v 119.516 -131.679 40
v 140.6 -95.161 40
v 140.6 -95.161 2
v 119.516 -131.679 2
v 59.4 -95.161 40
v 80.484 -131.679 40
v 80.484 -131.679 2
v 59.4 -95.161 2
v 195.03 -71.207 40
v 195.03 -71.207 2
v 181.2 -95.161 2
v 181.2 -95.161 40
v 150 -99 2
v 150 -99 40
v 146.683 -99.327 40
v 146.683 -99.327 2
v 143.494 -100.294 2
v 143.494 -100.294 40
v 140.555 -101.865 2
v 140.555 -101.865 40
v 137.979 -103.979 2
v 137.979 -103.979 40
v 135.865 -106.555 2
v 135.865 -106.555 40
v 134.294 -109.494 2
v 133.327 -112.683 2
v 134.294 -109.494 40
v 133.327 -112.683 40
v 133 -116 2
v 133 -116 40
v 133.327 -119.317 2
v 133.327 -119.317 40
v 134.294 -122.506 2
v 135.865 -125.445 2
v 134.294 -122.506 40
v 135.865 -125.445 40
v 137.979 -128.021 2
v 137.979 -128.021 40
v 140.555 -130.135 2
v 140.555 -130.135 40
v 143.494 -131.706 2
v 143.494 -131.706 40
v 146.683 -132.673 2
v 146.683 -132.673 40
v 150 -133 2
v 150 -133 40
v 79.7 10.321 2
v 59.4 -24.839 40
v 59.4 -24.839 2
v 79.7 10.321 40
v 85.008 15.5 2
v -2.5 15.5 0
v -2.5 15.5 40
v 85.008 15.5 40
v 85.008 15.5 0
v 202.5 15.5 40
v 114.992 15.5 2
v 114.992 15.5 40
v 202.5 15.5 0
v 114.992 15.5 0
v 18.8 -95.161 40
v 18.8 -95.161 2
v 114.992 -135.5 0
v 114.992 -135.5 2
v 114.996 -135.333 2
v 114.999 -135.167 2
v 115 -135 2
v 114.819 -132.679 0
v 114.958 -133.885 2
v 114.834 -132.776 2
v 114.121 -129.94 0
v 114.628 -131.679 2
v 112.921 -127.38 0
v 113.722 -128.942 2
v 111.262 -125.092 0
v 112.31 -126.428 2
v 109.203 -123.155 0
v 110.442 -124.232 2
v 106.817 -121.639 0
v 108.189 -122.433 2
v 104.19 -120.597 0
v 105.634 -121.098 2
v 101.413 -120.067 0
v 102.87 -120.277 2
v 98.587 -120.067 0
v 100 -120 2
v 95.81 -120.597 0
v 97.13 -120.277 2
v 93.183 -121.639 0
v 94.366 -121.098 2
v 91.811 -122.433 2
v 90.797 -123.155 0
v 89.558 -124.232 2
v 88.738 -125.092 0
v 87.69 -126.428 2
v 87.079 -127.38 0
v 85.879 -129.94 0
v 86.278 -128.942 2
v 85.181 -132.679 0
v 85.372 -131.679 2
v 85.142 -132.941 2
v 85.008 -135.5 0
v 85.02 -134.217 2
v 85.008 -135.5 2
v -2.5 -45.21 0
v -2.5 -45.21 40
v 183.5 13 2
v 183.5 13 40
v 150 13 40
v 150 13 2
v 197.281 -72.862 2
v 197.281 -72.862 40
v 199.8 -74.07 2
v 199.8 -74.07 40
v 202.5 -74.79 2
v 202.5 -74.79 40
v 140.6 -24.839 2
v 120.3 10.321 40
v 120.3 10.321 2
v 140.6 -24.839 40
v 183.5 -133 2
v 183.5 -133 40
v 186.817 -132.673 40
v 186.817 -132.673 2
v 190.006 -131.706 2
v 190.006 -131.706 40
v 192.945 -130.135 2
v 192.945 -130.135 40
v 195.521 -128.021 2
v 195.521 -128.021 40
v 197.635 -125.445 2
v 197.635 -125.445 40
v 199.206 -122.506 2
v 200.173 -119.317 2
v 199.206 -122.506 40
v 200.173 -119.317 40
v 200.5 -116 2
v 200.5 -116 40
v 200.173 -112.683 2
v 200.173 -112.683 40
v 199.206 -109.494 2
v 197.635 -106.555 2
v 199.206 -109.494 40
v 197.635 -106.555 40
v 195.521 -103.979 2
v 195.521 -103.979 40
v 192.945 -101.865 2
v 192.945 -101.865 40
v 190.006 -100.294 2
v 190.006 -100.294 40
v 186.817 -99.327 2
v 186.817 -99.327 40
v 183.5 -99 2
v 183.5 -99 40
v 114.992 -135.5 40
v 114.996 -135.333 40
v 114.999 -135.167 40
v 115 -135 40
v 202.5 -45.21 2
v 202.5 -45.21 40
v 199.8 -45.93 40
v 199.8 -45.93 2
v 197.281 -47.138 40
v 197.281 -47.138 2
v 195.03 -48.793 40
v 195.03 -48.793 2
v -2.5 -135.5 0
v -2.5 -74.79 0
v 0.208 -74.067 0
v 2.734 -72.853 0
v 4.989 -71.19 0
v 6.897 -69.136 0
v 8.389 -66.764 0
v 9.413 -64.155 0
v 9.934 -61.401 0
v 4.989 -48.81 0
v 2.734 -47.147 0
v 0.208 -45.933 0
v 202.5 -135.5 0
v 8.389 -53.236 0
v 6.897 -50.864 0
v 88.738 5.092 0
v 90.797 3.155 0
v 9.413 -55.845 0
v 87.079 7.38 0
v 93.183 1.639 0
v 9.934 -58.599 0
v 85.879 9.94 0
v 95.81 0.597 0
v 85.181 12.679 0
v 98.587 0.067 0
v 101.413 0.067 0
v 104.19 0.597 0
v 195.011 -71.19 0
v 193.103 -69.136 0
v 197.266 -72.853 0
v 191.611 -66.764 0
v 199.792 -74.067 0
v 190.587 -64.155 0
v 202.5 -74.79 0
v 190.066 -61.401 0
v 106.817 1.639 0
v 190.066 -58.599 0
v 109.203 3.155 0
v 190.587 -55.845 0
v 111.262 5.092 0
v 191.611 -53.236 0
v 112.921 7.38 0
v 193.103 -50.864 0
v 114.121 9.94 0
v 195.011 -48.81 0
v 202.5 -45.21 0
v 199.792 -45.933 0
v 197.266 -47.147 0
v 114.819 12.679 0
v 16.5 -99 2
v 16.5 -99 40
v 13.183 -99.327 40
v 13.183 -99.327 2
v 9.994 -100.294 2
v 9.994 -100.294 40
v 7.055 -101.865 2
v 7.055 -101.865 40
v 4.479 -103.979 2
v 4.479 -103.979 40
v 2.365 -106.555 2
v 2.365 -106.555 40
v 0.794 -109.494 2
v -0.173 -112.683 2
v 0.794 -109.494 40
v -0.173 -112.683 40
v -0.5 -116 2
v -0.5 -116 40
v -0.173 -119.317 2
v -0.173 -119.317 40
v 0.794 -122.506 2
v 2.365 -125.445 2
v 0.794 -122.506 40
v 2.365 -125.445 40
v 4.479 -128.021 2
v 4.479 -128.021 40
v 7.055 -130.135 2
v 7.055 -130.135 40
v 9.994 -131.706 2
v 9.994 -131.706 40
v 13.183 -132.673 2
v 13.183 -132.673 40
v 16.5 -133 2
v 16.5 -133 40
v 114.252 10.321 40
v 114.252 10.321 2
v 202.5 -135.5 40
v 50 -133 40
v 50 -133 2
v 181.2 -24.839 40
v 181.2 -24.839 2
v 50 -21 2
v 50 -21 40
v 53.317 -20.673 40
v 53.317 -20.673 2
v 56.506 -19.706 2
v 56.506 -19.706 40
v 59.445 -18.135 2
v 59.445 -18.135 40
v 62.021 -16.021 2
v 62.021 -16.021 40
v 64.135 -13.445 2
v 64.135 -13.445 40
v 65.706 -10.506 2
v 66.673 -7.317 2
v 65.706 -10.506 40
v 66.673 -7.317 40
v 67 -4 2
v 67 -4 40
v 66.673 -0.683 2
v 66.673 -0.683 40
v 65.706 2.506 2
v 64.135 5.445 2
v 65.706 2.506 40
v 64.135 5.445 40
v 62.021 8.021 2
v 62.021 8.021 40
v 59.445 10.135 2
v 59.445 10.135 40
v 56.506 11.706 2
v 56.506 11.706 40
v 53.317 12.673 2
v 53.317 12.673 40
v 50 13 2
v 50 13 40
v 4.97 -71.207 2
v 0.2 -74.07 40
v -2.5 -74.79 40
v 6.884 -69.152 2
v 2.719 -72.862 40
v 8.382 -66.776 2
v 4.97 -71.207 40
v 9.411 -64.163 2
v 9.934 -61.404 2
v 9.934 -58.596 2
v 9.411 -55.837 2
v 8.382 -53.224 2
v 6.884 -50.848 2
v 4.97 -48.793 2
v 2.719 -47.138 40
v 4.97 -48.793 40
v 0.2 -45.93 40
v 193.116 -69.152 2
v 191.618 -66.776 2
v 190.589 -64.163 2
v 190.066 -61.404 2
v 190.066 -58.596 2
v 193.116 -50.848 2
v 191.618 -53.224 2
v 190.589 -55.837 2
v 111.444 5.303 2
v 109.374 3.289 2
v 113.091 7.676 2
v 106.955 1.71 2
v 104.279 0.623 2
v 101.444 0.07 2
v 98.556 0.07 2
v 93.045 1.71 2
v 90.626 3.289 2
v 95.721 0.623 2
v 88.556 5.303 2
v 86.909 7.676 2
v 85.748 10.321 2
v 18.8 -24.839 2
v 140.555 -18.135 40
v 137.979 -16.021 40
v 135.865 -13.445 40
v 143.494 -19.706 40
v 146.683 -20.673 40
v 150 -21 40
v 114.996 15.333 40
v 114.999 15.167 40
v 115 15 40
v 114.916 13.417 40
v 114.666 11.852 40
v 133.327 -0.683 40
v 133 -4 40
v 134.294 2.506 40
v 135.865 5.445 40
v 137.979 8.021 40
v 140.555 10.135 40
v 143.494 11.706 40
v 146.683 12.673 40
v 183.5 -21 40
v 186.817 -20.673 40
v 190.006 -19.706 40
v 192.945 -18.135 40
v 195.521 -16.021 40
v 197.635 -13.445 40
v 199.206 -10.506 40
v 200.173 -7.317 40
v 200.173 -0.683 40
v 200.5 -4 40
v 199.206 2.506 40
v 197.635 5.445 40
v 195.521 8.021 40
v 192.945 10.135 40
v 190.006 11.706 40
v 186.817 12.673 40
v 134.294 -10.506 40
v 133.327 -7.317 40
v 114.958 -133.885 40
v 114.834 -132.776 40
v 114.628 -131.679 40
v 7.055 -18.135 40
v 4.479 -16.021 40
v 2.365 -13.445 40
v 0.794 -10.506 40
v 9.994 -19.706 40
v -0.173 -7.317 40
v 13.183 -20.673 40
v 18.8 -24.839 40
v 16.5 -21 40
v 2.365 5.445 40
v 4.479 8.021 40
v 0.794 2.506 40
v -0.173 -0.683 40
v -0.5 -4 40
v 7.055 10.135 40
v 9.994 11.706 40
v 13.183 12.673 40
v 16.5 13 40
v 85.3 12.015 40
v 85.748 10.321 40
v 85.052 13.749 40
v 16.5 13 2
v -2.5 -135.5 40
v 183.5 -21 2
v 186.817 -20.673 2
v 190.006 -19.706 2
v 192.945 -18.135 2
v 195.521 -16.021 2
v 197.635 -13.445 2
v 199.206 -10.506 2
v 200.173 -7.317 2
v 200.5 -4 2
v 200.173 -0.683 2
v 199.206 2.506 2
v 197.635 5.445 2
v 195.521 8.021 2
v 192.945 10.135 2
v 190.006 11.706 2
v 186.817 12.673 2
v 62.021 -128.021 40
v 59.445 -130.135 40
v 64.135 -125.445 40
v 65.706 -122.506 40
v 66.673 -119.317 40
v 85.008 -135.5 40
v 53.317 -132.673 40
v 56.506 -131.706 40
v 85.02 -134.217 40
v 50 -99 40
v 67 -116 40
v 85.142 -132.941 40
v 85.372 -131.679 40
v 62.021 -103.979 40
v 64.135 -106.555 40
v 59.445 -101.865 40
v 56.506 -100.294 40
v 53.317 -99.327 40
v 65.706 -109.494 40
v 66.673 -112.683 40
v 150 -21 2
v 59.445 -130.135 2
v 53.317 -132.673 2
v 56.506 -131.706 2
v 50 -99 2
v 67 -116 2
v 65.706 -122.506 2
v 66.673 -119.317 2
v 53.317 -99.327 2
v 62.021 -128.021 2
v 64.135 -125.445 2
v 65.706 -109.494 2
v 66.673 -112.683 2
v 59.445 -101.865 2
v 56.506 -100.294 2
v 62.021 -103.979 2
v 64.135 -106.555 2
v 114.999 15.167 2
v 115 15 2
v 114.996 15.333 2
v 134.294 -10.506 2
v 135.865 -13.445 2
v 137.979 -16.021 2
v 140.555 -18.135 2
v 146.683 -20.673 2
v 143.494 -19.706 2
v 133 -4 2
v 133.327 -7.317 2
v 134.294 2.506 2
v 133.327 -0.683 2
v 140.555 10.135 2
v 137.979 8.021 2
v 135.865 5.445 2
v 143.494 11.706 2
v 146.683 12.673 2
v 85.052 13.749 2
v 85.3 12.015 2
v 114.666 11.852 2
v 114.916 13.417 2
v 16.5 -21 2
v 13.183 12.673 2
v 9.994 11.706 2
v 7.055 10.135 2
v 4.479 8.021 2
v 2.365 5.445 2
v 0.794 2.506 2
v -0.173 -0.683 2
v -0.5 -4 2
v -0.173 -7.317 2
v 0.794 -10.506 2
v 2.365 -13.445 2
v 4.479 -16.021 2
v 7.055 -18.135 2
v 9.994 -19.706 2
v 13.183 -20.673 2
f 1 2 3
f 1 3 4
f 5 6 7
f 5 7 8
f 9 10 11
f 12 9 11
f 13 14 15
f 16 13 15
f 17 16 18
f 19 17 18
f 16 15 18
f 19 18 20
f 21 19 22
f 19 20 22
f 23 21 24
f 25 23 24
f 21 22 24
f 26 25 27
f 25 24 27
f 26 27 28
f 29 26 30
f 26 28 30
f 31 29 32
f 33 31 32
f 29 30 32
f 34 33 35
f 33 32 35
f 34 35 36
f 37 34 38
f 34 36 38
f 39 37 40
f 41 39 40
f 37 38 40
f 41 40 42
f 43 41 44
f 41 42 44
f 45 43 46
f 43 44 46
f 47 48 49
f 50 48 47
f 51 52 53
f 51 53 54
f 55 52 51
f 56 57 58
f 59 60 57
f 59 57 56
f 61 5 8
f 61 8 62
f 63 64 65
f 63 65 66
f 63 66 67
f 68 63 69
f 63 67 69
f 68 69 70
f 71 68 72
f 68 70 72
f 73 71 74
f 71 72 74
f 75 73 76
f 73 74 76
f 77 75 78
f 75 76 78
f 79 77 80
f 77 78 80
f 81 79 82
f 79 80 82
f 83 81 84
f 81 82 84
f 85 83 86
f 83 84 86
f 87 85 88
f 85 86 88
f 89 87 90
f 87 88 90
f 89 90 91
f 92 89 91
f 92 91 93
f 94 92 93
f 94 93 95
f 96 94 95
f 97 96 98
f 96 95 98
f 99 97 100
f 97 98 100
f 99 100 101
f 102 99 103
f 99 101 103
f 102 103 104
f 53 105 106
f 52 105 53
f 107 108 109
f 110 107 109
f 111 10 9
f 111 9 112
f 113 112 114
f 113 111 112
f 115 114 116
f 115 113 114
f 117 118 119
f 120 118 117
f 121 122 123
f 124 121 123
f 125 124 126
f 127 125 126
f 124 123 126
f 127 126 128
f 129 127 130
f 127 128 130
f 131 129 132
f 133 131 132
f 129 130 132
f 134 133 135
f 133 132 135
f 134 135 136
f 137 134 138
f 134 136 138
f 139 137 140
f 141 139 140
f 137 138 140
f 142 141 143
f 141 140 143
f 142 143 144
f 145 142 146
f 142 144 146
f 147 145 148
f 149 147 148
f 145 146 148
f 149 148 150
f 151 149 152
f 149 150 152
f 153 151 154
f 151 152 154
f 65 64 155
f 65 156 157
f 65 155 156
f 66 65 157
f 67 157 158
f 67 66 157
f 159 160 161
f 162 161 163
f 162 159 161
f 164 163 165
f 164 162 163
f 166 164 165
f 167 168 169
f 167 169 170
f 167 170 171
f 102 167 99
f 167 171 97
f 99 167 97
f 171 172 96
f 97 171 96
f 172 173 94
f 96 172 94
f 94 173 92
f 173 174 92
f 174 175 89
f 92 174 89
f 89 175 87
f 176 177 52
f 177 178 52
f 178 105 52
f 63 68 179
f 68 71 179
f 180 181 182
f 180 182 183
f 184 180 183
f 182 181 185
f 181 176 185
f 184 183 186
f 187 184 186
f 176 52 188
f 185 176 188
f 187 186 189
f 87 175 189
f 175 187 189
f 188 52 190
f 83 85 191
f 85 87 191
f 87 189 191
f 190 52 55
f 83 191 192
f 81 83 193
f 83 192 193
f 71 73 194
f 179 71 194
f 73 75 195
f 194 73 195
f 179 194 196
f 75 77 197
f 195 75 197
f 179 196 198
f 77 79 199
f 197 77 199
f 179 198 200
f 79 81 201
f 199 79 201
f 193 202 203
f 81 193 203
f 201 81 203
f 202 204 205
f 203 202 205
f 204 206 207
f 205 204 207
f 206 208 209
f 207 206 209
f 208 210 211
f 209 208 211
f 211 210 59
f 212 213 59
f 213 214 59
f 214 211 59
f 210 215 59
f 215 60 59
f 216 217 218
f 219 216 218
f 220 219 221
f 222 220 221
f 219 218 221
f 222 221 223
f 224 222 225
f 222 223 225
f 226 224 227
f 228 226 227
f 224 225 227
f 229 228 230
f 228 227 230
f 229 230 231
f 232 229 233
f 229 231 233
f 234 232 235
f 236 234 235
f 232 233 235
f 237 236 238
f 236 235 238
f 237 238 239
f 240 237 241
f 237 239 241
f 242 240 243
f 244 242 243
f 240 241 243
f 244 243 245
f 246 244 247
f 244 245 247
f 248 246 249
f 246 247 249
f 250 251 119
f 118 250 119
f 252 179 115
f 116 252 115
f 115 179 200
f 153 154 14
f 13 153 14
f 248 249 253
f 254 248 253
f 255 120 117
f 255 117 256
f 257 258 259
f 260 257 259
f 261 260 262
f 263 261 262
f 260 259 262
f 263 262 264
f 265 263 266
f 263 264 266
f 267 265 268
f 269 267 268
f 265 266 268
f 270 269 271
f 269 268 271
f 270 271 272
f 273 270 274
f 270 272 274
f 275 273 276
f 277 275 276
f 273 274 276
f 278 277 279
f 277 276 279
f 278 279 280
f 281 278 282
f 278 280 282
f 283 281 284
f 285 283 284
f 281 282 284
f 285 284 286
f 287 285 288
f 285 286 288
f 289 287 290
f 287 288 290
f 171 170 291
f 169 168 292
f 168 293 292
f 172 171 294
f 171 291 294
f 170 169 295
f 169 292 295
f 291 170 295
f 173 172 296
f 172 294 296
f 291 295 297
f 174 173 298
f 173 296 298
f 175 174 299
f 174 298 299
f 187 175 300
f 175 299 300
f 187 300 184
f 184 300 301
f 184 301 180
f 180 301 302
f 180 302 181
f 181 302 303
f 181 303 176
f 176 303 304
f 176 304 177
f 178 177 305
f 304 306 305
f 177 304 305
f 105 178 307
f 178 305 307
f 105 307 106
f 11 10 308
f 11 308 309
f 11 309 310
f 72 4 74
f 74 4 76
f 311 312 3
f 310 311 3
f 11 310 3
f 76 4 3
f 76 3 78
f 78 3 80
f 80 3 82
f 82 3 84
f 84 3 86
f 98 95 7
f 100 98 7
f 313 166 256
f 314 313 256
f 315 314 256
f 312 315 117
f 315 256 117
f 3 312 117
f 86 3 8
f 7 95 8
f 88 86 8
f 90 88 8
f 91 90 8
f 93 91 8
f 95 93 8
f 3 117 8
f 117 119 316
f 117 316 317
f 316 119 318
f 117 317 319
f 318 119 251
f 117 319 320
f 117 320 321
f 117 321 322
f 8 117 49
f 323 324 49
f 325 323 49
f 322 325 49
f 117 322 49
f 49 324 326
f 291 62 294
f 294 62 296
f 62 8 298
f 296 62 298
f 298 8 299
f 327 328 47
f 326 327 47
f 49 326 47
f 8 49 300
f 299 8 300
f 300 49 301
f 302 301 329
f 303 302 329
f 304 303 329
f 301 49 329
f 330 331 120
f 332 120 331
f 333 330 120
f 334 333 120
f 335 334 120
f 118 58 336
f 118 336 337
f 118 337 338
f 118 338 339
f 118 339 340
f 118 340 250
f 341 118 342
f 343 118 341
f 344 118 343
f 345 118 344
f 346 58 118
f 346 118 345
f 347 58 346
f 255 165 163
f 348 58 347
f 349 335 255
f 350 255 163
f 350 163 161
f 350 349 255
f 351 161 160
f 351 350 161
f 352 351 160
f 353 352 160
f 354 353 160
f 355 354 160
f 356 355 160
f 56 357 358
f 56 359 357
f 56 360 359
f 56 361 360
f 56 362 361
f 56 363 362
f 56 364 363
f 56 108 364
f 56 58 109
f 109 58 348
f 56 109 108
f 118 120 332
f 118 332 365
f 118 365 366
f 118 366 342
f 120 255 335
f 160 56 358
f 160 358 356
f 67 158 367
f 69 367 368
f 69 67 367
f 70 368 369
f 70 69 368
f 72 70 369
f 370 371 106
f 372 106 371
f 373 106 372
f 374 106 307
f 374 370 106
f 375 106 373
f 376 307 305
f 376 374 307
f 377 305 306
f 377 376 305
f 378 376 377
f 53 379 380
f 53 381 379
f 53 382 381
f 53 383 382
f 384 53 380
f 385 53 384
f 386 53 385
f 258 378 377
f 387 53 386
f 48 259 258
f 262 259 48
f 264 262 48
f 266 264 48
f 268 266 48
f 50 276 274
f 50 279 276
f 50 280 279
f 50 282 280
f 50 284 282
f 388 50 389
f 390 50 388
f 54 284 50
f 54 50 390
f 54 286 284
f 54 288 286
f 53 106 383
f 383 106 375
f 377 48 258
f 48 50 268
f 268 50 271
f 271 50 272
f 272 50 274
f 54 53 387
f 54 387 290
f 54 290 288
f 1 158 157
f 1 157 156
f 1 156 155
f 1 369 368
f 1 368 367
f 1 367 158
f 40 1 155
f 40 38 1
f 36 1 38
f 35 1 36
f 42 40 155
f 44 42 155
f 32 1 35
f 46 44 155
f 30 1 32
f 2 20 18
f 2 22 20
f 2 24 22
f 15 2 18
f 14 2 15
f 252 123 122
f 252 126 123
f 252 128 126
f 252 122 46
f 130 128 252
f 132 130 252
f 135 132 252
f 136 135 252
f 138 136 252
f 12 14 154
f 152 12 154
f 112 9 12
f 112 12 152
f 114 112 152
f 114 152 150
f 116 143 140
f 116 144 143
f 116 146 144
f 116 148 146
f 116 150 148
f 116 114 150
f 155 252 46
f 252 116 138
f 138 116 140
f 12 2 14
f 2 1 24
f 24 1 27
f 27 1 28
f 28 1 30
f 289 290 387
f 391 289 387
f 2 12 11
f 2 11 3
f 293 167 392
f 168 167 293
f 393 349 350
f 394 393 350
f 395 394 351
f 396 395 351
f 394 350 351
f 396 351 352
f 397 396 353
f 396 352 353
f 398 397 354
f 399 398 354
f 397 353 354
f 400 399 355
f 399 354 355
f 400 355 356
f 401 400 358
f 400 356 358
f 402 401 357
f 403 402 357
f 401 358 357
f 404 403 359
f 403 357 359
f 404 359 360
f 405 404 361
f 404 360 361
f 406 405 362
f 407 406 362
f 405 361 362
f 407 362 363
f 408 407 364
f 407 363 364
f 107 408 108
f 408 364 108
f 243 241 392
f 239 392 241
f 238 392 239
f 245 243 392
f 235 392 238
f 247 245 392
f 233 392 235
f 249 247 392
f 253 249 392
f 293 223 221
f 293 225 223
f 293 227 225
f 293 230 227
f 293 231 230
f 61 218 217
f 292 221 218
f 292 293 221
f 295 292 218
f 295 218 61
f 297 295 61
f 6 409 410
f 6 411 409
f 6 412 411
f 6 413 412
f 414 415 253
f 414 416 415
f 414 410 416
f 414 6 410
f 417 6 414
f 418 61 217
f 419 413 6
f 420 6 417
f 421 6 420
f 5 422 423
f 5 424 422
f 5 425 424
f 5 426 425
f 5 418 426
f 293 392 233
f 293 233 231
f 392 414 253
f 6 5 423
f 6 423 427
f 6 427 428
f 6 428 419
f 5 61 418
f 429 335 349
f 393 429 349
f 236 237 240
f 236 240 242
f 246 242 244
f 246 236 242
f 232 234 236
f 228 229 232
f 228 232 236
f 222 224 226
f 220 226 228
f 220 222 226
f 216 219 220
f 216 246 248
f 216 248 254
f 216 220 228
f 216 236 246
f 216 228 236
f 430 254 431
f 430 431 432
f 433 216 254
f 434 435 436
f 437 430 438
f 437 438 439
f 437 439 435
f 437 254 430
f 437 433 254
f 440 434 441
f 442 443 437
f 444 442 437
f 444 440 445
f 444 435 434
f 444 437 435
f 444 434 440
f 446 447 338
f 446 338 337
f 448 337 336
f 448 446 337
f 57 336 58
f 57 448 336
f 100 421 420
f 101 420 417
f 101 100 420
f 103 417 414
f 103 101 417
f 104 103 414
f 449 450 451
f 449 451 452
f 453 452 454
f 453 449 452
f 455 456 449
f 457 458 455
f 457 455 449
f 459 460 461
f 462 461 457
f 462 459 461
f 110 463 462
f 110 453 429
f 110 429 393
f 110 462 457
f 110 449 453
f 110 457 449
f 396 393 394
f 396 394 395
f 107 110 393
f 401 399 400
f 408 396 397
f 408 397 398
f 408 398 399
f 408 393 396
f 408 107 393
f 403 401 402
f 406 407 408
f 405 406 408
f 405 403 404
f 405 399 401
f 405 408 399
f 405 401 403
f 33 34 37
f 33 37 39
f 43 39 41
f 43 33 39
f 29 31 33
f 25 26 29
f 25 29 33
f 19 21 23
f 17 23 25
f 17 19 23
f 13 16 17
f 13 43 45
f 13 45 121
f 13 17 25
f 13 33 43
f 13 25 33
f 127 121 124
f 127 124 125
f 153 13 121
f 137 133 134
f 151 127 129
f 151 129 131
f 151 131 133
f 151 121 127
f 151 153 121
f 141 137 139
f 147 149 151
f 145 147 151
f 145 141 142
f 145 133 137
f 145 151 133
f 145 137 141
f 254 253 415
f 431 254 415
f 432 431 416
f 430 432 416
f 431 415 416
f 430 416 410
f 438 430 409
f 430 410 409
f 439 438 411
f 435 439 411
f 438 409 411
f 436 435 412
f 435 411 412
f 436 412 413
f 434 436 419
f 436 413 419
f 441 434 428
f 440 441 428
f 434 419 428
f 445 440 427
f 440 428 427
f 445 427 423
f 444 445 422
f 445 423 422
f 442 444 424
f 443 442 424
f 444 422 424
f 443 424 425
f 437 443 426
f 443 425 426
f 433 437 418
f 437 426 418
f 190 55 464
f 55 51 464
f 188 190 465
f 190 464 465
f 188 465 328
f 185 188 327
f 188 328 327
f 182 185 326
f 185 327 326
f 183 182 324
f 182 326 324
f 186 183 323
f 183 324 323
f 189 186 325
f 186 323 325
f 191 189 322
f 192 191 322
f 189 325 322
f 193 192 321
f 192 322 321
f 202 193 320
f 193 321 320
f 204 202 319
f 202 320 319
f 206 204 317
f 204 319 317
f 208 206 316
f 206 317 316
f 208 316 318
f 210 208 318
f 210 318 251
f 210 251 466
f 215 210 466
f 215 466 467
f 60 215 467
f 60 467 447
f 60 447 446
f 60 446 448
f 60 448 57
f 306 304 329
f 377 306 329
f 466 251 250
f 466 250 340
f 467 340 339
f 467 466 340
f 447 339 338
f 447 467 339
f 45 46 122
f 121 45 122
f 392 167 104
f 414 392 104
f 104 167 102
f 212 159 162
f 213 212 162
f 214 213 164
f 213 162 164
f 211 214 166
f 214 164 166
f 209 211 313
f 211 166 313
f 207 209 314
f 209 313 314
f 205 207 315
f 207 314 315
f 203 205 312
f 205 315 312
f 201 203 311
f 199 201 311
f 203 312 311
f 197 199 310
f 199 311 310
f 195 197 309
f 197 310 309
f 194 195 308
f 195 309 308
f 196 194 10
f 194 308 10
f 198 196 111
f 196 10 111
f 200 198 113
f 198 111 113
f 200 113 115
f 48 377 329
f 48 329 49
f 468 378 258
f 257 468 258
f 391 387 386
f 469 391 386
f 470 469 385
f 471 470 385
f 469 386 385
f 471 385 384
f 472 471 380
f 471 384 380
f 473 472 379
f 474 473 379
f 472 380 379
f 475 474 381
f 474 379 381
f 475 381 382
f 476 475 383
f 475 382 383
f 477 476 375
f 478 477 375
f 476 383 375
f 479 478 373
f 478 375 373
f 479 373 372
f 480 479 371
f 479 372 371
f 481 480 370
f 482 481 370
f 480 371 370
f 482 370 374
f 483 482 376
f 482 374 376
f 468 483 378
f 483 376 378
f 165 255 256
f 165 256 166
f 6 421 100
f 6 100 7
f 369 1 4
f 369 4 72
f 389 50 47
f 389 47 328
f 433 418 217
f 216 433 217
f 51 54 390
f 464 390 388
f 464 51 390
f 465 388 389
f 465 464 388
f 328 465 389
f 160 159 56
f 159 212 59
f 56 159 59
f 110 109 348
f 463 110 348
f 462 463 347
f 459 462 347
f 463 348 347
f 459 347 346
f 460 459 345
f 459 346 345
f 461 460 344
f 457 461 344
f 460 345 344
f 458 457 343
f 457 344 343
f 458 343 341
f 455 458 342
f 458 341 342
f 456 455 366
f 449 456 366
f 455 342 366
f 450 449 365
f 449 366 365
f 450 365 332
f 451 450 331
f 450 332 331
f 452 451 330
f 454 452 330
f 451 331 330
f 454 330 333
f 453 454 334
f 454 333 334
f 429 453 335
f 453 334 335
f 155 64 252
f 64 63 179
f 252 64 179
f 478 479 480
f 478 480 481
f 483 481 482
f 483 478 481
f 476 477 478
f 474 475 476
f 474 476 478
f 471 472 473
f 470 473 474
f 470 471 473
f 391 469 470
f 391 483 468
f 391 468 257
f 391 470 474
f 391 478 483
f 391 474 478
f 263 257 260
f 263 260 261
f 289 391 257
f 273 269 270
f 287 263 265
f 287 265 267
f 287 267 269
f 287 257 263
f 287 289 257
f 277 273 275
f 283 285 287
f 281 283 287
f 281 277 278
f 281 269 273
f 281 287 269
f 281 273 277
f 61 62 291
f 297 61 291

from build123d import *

# Parameters (mm, degrees)
SKETCH003_W          = 205
SKETCH003_H          = 151
PAD001_DEPTH         = 40
POCKET002_DEPTH      = 38
SKETCH005_R          = 15
POCKET003_DEPTH      = 2.001
POCKET003_DEPTH_BACK = 38.001
POCKET004_DEPTH      = 38


with BuildPart() as part:
    # Sketch003 → Pad001 (new body)
    with BuildSketch(Plane.XY):
        Rectangle(SKETCH003_W, SKETCH003_H)
    extrude(amount=PAD001_DEPTH)

    # Sketch004 (on Face6 of Pad001) → Pocket002 (cut)
    with BuildSketch(Plane.XY.offset(40)):
        Polygon((-101.5, 0), (-81.2, 35.160631), (-40.6, 35.160631), (-20.3, 70.321263), (20.3, 70.321263), (40.6, 35.160631), (81.2, 35.160631), (101.5, 0), (81.2, -35.160631), (40.6, -35.160631), (19.516262, -71.678737), (-19.516262, -71.678737), (-40.6, -35.160631), (-81.2, -35.160631), align=None)
    extrude(amount=-POCKET002_DEPTH, mode=Mode.SUBTRACT)

    # Sketch005 → Pocket003 (cut, two sides)
    with BuildSketch(Plane.XY.offset(2)) as pocket003_sk:
        with Locations((105, 0)):
            Circle(SKETCH005_R)
        with Locations((0, 75)):
            Circle(SKETCH005_R)
        with Locations((0, -75)):
            Circle(SKETCH005_R)
        with Locations((-105, 0)):
            Circle(SKETCH005_R)
    extrude(amount=-POCKET003_DEPTH, mode=Mode.SUBTRACT)
    extrude(pocket003_sk.sketch, amount=POCKET003_DEPTH_BACK, mode=Mode.SUBTRACT)

    # Sketch006 (on Face6 of Pad001) → Pocket004 (cut)
    with BuildSketch(Plane.XY.offset(40)):
        with BuildLine():
            ThreePointArc((-83.5, -39), (-100.5, -56), (-83.5, -73))
            Line((-83.5, -73), (-50, -73))
            ThreePointArc((-50, -73), (-33, -56), (-50, -39))
            Line((-50, -39), (-83.5, -39))
        make_face()
        with BuildLine():
            ThreePointArc((50, -39), (33, -56), (50, -73))
            Line((50, -73), (83.5, -73))
            ThreePointArc((83.5, -73), (100.5, -56), (83.5, -39))
            Line((83.5, -39), (50, -39))
        make_face()
        with BuildLine():
            ThreePointArc((50, 73), (33, 56), (50, 39))
            Line((50, 39), (83.5, 39))
            ThreePointArc((83.5, 39), (100.5, 56), (83.5, 73))
            Line((83.5, 73), (50, 73))
        make_face()
        with BuildLine():
            ThreePointArc((-83.5, 73), (-100.5, 56), (-83.5, 39))
            Line((-83.5, 39), (-50, 39))
            ThreePointArc((-50, 39), (-33, 56), (-50, 73))
            Line((-50, 73), (-83.5, 73))
        make_face()
    extrude(amount=-POCKET004_DEPTH, mode=Mode.SUBTRACT)


with BuildPart() as part_1:
    # Body001 placement: moved
    add(part.part.moved(Location((100, -60, 0))))


solid = part_1.part
